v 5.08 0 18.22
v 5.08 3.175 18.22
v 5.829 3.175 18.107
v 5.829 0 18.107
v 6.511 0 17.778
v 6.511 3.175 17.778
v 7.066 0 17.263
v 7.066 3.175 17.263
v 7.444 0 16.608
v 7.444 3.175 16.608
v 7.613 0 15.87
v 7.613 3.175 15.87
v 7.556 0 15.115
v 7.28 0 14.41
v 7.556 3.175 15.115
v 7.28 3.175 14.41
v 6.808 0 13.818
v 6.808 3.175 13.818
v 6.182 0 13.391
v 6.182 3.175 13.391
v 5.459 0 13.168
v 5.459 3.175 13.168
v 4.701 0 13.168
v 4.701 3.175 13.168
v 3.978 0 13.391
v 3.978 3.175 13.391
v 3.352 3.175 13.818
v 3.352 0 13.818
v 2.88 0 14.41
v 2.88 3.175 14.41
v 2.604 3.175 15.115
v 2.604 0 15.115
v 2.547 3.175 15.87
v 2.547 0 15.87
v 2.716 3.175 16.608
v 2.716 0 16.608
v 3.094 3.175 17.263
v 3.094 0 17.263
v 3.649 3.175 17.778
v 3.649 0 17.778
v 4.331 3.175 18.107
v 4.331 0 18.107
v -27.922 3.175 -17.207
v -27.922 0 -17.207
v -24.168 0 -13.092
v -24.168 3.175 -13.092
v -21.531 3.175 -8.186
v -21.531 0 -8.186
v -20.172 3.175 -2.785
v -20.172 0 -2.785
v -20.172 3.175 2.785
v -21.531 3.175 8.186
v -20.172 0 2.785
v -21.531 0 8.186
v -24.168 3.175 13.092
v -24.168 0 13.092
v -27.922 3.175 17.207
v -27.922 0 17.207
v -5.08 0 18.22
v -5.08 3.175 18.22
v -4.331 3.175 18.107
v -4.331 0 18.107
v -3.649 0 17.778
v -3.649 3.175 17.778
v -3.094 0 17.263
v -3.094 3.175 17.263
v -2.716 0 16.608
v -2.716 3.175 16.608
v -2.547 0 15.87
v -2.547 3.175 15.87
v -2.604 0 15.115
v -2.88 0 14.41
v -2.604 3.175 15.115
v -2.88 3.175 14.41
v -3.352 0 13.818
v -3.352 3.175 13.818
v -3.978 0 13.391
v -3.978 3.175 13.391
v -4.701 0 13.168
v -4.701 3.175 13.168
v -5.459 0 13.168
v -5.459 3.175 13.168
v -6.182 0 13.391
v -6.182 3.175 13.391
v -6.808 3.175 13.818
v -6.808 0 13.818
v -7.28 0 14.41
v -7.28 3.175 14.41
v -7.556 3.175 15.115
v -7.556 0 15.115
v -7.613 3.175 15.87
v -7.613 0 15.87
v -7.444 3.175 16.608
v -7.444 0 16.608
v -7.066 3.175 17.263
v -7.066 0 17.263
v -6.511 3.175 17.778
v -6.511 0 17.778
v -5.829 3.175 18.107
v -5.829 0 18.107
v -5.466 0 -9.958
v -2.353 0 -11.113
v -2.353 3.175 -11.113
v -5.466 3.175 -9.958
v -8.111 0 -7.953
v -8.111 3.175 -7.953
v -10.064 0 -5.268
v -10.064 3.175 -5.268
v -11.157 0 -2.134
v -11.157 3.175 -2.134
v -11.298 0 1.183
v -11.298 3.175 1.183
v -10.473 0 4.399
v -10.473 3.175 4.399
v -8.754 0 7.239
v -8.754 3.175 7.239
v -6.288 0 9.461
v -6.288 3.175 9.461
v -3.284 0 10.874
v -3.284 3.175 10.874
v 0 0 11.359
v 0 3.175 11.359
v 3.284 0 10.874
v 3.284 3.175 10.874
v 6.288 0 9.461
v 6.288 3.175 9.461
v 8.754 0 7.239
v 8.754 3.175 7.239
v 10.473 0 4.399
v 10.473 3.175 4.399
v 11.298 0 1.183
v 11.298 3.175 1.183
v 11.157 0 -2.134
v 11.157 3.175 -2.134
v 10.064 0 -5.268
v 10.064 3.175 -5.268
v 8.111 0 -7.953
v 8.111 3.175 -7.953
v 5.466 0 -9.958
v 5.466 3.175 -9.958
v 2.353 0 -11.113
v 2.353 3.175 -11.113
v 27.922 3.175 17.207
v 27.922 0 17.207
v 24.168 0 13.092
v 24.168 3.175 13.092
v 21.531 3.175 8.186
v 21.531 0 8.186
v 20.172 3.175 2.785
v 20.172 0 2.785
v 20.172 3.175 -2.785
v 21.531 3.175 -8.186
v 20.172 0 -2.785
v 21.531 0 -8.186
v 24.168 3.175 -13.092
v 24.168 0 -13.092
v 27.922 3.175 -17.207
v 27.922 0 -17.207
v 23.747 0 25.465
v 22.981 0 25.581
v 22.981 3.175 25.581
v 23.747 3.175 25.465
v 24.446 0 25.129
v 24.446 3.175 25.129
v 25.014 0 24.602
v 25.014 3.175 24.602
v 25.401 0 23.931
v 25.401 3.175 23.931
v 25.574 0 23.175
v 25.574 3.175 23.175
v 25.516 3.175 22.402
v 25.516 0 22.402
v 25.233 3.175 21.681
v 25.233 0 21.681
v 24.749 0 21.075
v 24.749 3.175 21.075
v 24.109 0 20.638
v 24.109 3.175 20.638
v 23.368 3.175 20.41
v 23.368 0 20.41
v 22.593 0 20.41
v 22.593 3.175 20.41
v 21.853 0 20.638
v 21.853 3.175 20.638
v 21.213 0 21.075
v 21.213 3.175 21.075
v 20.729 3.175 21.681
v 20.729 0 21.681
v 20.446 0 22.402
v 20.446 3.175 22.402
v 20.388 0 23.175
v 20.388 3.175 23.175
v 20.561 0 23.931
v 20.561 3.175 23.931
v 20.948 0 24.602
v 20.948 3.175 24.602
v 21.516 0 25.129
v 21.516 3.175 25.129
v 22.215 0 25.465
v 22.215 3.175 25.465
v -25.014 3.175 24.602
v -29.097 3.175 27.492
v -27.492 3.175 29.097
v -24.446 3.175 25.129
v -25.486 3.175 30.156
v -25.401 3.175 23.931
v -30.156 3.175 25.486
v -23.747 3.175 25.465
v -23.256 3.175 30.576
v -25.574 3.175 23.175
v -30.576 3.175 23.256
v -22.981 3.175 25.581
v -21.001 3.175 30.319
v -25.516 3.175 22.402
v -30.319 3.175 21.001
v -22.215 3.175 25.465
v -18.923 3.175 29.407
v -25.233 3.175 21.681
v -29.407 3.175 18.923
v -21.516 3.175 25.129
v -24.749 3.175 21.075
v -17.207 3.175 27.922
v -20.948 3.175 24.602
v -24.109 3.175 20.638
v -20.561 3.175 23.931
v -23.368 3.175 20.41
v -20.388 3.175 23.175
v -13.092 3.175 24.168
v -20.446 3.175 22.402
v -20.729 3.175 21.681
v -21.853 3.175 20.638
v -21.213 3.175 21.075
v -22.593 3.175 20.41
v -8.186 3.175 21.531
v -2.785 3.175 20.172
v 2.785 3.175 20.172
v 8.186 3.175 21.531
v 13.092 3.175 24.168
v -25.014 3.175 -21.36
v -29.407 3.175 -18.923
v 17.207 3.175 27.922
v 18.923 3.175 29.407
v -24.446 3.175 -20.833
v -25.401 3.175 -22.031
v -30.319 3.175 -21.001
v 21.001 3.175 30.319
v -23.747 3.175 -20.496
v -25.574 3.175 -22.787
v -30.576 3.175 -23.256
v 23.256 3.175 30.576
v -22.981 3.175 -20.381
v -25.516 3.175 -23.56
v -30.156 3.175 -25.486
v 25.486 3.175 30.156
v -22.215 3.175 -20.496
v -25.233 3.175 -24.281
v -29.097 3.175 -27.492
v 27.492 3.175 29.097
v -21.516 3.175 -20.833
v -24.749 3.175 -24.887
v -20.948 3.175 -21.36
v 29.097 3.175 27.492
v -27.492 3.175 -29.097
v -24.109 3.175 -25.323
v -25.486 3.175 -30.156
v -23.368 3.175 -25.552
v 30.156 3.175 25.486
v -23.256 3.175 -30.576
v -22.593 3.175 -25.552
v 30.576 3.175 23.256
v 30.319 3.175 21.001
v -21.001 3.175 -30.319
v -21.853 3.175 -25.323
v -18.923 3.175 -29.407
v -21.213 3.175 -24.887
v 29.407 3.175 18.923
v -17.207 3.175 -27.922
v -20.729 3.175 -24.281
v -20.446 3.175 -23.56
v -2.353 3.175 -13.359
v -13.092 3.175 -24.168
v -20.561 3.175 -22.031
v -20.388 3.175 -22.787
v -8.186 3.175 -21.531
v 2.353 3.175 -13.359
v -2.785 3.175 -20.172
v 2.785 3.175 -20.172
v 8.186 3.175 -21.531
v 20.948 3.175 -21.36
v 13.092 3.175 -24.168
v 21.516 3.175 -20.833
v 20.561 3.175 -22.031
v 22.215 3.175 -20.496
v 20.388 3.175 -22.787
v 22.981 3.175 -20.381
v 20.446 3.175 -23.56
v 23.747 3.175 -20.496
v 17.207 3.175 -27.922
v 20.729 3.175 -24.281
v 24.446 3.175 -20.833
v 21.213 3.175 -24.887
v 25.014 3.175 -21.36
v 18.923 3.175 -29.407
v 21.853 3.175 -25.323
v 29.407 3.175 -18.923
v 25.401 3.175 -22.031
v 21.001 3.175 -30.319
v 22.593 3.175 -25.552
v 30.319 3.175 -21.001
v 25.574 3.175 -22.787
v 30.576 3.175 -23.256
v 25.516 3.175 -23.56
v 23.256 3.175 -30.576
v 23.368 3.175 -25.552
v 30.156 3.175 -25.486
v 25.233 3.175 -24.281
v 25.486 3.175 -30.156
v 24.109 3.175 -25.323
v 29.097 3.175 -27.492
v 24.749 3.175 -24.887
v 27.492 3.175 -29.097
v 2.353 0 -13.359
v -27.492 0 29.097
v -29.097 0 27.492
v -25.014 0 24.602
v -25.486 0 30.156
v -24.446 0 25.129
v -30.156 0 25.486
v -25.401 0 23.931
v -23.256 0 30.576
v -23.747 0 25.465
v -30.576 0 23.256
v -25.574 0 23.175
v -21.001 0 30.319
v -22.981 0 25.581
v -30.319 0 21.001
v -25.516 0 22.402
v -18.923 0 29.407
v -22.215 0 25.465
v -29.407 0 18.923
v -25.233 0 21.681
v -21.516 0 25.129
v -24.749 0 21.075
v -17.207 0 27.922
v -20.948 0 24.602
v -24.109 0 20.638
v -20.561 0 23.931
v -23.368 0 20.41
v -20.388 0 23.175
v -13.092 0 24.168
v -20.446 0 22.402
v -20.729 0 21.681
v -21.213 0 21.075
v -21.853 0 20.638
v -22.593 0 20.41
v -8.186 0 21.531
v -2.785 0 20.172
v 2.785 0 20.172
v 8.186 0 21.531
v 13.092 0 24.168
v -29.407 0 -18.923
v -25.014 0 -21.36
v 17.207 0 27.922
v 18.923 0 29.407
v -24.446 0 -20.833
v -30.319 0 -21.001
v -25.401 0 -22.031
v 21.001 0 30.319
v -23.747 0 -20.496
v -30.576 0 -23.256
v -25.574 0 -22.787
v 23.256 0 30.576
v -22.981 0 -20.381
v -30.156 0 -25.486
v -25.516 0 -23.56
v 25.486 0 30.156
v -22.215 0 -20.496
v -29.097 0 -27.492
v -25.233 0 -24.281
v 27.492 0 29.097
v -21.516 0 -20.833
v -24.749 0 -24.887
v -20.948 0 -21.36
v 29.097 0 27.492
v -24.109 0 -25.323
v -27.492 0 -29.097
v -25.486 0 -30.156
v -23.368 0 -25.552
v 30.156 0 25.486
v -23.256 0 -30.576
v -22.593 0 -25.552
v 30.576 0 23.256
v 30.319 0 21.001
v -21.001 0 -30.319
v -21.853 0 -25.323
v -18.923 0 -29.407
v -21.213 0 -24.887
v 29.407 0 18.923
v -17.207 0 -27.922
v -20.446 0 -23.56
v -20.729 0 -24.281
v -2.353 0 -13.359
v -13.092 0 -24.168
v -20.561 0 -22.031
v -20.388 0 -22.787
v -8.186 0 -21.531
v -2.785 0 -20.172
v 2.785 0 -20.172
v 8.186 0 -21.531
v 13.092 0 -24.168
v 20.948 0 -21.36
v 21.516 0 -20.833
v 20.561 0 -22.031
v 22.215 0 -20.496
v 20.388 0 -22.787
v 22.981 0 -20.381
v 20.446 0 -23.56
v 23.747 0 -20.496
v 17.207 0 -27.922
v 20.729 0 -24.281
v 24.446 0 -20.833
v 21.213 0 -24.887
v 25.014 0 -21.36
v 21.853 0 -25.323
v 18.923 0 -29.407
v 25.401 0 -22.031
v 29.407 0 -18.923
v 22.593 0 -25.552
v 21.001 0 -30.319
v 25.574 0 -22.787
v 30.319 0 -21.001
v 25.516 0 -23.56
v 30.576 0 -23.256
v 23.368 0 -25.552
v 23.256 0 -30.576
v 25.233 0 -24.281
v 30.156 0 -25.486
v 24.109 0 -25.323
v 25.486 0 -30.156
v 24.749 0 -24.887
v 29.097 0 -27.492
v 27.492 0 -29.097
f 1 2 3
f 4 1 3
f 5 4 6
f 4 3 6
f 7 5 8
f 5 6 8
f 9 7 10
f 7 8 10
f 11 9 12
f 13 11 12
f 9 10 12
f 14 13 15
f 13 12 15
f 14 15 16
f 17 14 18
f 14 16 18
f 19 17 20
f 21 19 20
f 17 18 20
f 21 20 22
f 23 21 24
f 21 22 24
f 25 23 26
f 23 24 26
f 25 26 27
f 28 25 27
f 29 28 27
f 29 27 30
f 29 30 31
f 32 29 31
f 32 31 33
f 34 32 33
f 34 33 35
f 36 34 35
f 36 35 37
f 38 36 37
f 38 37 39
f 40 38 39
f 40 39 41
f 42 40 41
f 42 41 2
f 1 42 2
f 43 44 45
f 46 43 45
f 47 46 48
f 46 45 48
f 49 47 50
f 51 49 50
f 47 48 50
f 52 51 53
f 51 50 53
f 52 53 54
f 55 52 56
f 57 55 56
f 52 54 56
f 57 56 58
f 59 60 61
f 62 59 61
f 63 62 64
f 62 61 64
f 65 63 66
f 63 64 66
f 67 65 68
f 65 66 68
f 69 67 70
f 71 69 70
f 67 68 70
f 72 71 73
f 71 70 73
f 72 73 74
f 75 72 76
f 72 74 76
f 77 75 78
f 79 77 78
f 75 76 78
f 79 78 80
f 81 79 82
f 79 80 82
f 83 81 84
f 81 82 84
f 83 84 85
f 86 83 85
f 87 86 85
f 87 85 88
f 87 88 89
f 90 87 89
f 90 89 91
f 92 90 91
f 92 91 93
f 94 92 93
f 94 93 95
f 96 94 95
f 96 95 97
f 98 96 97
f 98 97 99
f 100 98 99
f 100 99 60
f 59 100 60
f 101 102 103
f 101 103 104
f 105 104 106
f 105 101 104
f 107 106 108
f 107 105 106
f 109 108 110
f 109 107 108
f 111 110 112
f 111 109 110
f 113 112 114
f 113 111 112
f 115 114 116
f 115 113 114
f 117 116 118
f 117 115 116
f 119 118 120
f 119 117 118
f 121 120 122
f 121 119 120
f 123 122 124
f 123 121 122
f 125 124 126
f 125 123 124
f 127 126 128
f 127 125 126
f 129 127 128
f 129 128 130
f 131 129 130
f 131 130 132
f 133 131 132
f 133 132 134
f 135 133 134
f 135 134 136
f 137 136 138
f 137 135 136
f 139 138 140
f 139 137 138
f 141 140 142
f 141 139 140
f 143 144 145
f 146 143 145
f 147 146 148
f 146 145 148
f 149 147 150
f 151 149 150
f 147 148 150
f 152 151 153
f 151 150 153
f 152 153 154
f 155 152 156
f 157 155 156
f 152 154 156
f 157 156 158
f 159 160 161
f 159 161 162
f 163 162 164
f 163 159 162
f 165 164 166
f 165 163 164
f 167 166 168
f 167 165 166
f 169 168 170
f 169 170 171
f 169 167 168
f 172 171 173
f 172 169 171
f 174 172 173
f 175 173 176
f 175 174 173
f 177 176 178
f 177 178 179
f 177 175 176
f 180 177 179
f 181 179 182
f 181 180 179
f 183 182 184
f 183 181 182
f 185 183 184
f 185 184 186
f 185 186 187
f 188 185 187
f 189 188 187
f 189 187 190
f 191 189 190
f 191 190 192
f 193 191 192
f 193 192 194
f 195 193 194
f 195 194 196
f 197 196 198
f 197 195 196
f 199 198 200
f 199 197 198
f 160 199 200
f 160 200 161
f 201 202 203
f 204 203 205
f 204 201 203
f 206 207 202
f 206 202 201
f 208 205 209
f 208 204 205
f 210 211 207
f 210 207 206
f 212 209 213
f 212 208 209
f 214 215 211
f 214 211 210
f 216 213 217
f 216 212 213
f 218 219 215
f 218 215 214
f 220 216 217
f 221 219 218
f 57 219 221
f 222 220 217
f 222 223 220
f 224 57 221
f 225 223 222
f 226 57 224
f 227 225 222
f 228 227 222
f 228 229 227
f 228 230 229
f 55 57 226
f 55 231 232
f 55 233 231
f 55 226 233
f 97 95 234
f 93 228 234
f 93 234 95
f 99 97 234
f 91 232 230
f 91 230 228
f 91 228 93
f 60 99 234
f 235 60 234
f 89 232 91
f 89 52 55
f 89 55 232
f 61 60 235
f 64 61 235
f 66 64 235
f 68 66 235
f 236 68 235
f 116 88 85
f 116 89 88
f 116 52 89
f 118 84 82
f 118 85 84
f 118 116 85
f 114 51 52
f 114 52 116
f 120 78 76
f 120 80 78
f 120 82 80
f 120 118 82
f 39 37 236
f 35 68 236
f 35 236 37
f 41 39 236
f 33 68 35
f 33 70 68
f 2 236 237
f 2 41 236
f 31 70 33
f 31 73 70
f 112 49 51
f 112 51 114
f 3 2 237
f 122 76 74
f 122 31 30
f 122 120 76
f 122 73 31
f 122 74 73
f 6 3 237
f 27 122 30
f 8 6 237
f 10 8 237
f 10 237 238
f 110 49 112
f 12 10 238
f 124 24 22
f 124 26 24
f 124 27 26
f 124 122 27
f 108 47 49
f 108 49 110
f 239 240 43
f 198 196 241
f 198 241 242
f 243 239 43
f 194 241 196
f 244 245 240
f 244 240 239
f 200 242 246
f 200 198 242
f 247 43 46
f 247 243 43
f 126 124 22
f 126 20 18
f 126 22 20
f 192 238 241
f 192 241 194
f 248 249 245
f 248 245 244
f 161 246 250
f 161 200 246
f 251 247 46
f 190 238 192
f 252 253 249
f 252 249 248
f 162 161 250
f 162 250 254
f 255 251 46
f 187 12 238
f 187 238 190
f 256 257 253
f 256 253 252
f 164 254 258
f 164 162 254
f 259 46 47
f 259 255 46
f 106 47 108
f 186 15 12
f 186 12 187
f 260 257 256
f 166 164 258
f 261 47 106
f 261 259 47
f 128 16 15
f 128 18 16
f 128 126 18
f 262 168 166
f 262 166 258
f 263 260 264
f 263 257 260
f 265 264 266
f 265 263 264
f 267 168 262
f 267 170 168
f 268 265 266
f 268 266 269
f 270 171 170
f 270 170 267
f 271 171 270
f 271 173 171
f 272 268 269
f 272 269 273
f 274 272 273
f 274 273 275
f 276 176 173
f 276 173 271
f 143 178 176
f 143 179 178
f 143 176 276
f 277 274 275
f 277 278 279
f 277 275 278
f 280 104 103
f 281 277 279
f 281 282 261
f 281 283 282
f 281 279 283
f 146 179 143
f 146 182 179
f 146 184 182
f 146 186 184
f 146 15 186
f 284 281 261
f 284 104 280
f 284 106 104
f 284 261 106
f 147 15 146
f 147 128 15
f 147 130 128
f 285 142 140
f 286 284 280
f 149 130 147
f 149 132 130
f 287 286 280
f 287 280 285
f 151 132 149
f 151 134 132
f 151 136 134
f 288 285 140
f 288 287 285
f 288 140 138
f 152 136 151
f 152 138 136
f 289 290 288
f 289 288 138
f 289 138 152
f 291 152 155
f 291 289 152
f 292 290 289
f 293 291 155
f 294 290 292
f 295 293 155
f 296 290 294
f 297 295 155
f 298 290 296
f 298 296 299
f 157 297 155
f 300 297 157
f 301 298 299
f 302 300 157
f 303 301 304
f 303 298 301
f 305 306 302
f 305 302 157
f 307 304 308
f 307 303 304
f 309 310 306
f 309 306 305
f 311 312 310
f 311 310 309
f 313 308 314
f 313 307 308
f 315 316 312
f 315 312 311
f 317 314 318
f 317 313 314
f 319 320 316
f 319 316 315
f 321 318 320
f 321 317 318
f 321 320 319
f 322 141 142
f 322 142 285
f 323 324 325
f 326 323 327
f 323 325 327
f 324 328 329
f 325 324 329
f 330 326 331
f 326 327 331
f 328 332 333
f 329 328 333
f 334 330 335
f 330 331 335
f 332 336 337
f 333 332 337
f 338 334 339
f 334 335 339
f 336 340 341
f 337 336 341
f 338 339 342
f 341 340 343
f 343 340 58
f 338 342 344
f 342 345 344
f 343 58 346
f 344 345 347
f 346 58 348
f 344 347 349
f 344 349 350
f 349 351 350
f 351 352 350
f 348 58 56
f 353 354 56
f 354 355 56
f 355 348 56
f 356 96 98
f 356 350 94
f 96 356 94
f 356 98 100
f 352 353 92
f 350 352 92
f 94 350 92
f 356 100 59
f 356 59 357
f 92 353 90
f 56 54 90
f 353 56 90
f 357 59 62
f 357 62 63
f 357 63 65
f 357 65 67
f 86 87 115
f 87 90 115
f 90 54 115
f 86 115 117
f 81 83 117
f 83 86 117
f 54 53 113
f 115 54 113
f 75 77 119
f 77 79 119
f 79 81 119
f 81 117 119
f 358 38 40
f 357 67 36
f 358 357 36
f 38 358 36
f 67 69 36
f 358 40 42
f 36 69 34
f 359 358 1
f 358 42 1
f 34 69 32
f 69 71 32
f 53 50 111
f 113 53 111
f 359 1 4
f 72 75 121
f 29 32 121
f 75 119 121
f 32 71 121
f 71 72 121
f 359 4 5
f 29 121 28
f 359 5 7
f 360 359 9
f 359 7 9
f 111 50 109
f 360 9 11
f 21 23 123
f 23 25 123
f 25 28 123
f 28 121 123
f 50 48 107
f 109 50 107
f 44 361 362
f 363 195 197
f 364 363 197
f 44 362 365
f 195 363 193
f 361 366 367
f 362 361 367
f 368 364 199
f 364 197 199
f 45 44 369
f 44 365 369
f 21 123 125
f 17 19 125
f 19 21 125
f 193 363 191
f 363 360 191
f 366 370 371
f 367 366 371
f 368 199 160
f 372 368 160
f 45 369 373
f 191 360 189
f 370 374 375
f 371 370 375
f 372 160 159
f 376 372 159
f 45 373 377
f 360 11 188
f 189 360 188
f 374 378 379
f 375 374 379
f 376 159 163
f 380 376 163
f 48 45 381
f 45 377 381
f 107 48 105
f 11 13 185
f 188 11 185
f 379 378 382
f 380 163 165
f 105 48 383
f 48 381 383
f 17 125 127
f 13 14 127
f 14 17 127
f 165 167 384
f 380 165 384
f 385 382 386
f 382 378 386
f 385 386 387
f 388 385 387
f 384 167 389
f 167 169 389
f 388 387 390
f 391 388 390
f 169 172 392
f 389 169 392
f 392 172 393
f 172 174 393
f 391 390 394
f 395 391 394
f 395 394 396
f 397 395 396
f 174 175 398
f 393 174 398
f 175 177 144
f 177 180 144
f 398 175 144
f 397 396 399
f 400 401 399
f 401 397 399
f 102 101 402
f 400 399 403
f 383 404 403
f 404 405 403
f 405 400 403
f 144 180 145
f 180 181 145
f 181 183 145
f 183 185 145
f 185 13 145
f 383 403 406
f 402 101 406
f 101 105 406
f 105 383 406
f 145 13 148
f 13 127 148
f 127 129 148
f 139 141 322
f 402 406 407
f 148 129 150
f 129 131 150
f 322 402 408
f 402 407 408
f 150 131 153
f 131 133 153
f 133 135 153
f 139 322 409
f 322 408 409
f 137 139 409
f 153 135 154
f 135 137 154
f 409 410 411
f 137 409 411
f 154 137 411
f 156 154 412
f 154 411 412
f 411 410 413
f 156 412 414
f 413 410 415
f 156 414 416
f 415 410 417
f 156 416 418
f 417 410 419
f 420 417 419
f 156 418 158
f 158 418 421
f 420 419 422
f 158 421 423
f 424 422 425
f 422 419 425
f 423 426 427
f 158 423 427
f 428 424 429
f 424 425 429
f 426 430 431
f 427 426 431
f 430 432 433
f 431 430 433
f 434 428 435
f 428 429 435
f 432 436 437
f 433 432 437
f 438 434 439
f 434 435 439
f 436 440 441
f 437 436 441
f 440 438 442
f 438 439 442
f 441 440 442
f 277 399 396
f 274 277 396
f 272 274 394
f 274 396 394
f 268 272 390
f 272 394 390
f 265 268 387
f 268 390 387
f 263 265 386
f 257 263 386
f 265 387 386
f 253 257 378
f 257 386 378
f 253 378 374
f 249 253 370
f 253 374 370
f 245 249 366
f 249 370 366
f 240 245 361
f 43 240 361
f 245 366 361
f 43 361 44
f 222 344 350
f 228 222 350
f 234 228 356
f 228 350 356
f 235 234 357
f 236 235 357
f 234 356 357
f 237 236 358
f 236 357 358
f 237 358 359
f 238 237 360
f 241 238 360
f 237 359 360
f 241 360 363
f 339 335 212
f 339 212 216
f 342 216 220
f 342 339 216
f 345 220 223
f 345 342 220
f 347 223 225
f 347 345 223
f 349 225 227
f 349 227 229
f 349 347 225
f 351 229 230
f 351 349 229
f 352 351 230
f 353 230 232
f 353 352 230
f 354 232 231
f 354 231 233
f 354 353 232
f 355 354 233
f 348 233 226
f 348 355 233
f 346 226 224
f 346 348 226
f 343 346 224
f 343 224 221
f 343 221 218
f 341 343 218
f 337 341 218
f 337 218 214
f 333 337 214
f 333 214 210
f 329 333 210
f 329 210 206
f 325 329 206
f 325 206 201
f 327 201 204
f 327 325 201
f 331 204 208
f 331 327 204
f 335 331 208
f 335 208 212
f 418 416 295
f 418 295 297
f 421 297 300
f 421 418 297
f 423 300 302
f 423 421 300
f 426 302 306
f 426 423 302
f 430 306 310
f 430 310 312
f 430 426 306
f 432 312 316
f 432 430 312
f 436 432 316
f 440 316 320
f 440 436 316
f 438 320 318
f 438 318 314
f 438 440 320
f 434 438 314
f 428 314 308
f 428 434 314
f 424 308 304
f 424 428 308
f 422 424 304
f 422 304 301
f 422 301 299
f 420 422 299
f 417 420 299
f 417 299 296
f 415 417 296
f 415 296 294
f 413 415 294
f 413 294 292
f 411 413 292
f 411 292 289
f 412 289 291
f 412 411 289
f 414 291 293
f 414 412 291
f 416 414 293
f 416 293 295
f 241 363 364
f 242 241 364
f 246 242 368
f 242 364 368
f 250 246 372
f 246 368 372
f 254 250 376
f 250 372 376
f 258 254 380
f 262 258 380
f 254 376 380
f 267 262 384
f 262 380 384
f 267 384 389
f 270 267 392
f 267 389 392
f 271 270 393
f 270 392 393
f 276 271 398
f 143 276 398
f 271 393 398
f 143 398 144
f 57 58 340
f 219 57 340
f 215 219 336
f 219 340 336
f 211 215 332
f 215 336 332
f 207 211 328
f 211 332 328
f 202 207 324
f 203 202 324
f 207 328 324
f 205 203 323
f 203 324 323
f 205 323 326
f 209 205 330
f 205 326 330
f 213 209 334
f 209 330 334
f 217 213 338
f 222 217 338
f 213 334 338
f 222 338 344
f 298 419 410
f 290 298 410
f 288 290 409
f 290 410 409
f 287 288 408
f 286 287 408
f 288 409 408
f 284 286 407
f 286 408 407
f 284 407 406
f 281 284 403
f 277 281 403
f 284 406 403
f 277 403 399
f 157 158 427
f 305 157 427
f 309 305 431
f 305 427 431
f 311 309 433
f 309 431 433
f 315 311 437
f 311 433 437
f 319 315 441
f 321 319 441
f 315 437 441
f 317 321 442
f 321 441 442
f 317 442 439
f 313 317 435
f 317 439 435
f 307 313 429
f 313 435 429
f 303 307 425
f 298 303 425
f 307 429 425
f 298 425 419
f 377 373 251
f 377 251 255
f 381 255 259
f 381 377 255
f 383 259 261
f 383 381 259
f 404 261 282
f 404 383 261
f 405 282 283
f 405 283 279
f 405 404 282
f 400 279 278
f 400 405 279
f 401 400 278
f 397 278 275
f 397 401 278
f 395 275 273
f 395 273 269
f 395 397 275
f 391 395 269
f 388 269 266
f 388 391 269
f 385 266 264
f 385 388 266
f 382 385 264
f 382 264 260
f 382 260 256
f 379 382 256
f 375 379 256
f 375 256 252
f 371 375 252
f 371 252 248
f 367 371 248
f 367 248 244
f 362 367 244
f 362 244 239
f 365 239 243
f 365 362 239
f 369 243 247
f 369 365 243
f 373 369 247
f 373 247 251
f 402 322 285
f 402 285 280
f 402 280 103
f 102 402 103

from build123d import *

# Parameters (mm, degrees)
SKETCH1_R           = 2.6
BOSS_EXTRUDE1_DEPTH = 3.175
SKETCH2_R           = 2.54
CUT_EXTRUDE1_DEPTH  = 10


with BuildPart() as part:
    # Sketch1 → Boss-Extrude1 (new body)
    with BuildSketch(Plane(origin=(0, 0, 0), x_dir=(1, 0, 0), z_dir=(0, 1, 0))):
        with BuildLine():
            ThreePointArc((-17.206636662, 27.922333563), (-28.354981926, 28.354981926), (-27.922333563, 17.206636662))
            ThreePointArc((-27.922333563, 17.206636662), (-20, 0), (-27.922333563, -17.206636662))
            ThreePointArc((-27.922333563, -17.206636662), (-28.354981926, -28.354981926), (-17.206636662, -27.922333563))
            ThreePointArc((-17.206636662, -27.922333563), (0, -20), (17.206636662, -27.922333563))
            ThreePointArc((17.206636662, -27.922333563), (28.354981926, -28.354981926), (27.922333563, -17.206636662))
            ThreePointArc((27.922333563, -17.206636662), (20, 0), (27.922333563, 17.206636662))
            ThreePointArc((27.922333563, 17.206636662), (28.354981926, 28.354981926), (17.206636662, 27.922333563))
            ThreePointArc((17.206636662, 27.922333563), (0, 20), (-17.206636662, 27.922333563))
        make_face()
        with Locations(Location((22.980970389, 22.980970389, 0), (0, 0, 270))):
            Circle(SKETCH1_R, mode=Mode.SUBTRACT)
        with Locations(Location((22.980970389, -22.980970389, 0), (0, 0, 270))):
            Circle(SKETCH1_R, mode=Mode.SUBTRACT)
        with Locations(Location((-22.980970389, -22.980970389, 0), (0, 0, 270))):
            Circle(SKETCH1_R, mode=Mode.SUBTRACT)
        with Locations(Location((-22.980970389, 22.980970389, 0), (0, 0, 270))):
            Circle(SKETCH1_R, mode=Mode.SUBTRACT)
        with BuildLine():
            Line((2.353261567, 13.359444444), (-2.353261567, 13.359444444))
            Line((-2.353261567, 13.359444444), (-2.353261567, 11.113016606))
            ThreePointArc((-2.353261567, 11.113016606), (0, -11.359444444), (2.353261567, 11.113016606))
            Line((2.353261567, 11.113016606), (2.353261567, 13.359444444))
        make_face(mode=Mode.SUBTRACT)
    extrude(amount=BOSS_EXTRUDE1_DEPTH)

    # Sketch2 → Cut-Extrude1 (cut)
    with BuildSketch(Plane(origin=(0, 3.175, 0), x_dir=(1, 0, 0), z_dir=(0, 1, 0))):
        with Locations(Location((-5.08, -15.679722222, 0), (0, 0, 270))):
            Circle(SKETCH2_R)
        with Locations(Location((5.08, -15.679722222, 0), (0, 0, 270))):
            Circle(SKETCH2_R)
    extrude(amount=-CUT_EXTRUDE1_DEPTH, mode=Mode.SUBTRACT)


solid = part.part
